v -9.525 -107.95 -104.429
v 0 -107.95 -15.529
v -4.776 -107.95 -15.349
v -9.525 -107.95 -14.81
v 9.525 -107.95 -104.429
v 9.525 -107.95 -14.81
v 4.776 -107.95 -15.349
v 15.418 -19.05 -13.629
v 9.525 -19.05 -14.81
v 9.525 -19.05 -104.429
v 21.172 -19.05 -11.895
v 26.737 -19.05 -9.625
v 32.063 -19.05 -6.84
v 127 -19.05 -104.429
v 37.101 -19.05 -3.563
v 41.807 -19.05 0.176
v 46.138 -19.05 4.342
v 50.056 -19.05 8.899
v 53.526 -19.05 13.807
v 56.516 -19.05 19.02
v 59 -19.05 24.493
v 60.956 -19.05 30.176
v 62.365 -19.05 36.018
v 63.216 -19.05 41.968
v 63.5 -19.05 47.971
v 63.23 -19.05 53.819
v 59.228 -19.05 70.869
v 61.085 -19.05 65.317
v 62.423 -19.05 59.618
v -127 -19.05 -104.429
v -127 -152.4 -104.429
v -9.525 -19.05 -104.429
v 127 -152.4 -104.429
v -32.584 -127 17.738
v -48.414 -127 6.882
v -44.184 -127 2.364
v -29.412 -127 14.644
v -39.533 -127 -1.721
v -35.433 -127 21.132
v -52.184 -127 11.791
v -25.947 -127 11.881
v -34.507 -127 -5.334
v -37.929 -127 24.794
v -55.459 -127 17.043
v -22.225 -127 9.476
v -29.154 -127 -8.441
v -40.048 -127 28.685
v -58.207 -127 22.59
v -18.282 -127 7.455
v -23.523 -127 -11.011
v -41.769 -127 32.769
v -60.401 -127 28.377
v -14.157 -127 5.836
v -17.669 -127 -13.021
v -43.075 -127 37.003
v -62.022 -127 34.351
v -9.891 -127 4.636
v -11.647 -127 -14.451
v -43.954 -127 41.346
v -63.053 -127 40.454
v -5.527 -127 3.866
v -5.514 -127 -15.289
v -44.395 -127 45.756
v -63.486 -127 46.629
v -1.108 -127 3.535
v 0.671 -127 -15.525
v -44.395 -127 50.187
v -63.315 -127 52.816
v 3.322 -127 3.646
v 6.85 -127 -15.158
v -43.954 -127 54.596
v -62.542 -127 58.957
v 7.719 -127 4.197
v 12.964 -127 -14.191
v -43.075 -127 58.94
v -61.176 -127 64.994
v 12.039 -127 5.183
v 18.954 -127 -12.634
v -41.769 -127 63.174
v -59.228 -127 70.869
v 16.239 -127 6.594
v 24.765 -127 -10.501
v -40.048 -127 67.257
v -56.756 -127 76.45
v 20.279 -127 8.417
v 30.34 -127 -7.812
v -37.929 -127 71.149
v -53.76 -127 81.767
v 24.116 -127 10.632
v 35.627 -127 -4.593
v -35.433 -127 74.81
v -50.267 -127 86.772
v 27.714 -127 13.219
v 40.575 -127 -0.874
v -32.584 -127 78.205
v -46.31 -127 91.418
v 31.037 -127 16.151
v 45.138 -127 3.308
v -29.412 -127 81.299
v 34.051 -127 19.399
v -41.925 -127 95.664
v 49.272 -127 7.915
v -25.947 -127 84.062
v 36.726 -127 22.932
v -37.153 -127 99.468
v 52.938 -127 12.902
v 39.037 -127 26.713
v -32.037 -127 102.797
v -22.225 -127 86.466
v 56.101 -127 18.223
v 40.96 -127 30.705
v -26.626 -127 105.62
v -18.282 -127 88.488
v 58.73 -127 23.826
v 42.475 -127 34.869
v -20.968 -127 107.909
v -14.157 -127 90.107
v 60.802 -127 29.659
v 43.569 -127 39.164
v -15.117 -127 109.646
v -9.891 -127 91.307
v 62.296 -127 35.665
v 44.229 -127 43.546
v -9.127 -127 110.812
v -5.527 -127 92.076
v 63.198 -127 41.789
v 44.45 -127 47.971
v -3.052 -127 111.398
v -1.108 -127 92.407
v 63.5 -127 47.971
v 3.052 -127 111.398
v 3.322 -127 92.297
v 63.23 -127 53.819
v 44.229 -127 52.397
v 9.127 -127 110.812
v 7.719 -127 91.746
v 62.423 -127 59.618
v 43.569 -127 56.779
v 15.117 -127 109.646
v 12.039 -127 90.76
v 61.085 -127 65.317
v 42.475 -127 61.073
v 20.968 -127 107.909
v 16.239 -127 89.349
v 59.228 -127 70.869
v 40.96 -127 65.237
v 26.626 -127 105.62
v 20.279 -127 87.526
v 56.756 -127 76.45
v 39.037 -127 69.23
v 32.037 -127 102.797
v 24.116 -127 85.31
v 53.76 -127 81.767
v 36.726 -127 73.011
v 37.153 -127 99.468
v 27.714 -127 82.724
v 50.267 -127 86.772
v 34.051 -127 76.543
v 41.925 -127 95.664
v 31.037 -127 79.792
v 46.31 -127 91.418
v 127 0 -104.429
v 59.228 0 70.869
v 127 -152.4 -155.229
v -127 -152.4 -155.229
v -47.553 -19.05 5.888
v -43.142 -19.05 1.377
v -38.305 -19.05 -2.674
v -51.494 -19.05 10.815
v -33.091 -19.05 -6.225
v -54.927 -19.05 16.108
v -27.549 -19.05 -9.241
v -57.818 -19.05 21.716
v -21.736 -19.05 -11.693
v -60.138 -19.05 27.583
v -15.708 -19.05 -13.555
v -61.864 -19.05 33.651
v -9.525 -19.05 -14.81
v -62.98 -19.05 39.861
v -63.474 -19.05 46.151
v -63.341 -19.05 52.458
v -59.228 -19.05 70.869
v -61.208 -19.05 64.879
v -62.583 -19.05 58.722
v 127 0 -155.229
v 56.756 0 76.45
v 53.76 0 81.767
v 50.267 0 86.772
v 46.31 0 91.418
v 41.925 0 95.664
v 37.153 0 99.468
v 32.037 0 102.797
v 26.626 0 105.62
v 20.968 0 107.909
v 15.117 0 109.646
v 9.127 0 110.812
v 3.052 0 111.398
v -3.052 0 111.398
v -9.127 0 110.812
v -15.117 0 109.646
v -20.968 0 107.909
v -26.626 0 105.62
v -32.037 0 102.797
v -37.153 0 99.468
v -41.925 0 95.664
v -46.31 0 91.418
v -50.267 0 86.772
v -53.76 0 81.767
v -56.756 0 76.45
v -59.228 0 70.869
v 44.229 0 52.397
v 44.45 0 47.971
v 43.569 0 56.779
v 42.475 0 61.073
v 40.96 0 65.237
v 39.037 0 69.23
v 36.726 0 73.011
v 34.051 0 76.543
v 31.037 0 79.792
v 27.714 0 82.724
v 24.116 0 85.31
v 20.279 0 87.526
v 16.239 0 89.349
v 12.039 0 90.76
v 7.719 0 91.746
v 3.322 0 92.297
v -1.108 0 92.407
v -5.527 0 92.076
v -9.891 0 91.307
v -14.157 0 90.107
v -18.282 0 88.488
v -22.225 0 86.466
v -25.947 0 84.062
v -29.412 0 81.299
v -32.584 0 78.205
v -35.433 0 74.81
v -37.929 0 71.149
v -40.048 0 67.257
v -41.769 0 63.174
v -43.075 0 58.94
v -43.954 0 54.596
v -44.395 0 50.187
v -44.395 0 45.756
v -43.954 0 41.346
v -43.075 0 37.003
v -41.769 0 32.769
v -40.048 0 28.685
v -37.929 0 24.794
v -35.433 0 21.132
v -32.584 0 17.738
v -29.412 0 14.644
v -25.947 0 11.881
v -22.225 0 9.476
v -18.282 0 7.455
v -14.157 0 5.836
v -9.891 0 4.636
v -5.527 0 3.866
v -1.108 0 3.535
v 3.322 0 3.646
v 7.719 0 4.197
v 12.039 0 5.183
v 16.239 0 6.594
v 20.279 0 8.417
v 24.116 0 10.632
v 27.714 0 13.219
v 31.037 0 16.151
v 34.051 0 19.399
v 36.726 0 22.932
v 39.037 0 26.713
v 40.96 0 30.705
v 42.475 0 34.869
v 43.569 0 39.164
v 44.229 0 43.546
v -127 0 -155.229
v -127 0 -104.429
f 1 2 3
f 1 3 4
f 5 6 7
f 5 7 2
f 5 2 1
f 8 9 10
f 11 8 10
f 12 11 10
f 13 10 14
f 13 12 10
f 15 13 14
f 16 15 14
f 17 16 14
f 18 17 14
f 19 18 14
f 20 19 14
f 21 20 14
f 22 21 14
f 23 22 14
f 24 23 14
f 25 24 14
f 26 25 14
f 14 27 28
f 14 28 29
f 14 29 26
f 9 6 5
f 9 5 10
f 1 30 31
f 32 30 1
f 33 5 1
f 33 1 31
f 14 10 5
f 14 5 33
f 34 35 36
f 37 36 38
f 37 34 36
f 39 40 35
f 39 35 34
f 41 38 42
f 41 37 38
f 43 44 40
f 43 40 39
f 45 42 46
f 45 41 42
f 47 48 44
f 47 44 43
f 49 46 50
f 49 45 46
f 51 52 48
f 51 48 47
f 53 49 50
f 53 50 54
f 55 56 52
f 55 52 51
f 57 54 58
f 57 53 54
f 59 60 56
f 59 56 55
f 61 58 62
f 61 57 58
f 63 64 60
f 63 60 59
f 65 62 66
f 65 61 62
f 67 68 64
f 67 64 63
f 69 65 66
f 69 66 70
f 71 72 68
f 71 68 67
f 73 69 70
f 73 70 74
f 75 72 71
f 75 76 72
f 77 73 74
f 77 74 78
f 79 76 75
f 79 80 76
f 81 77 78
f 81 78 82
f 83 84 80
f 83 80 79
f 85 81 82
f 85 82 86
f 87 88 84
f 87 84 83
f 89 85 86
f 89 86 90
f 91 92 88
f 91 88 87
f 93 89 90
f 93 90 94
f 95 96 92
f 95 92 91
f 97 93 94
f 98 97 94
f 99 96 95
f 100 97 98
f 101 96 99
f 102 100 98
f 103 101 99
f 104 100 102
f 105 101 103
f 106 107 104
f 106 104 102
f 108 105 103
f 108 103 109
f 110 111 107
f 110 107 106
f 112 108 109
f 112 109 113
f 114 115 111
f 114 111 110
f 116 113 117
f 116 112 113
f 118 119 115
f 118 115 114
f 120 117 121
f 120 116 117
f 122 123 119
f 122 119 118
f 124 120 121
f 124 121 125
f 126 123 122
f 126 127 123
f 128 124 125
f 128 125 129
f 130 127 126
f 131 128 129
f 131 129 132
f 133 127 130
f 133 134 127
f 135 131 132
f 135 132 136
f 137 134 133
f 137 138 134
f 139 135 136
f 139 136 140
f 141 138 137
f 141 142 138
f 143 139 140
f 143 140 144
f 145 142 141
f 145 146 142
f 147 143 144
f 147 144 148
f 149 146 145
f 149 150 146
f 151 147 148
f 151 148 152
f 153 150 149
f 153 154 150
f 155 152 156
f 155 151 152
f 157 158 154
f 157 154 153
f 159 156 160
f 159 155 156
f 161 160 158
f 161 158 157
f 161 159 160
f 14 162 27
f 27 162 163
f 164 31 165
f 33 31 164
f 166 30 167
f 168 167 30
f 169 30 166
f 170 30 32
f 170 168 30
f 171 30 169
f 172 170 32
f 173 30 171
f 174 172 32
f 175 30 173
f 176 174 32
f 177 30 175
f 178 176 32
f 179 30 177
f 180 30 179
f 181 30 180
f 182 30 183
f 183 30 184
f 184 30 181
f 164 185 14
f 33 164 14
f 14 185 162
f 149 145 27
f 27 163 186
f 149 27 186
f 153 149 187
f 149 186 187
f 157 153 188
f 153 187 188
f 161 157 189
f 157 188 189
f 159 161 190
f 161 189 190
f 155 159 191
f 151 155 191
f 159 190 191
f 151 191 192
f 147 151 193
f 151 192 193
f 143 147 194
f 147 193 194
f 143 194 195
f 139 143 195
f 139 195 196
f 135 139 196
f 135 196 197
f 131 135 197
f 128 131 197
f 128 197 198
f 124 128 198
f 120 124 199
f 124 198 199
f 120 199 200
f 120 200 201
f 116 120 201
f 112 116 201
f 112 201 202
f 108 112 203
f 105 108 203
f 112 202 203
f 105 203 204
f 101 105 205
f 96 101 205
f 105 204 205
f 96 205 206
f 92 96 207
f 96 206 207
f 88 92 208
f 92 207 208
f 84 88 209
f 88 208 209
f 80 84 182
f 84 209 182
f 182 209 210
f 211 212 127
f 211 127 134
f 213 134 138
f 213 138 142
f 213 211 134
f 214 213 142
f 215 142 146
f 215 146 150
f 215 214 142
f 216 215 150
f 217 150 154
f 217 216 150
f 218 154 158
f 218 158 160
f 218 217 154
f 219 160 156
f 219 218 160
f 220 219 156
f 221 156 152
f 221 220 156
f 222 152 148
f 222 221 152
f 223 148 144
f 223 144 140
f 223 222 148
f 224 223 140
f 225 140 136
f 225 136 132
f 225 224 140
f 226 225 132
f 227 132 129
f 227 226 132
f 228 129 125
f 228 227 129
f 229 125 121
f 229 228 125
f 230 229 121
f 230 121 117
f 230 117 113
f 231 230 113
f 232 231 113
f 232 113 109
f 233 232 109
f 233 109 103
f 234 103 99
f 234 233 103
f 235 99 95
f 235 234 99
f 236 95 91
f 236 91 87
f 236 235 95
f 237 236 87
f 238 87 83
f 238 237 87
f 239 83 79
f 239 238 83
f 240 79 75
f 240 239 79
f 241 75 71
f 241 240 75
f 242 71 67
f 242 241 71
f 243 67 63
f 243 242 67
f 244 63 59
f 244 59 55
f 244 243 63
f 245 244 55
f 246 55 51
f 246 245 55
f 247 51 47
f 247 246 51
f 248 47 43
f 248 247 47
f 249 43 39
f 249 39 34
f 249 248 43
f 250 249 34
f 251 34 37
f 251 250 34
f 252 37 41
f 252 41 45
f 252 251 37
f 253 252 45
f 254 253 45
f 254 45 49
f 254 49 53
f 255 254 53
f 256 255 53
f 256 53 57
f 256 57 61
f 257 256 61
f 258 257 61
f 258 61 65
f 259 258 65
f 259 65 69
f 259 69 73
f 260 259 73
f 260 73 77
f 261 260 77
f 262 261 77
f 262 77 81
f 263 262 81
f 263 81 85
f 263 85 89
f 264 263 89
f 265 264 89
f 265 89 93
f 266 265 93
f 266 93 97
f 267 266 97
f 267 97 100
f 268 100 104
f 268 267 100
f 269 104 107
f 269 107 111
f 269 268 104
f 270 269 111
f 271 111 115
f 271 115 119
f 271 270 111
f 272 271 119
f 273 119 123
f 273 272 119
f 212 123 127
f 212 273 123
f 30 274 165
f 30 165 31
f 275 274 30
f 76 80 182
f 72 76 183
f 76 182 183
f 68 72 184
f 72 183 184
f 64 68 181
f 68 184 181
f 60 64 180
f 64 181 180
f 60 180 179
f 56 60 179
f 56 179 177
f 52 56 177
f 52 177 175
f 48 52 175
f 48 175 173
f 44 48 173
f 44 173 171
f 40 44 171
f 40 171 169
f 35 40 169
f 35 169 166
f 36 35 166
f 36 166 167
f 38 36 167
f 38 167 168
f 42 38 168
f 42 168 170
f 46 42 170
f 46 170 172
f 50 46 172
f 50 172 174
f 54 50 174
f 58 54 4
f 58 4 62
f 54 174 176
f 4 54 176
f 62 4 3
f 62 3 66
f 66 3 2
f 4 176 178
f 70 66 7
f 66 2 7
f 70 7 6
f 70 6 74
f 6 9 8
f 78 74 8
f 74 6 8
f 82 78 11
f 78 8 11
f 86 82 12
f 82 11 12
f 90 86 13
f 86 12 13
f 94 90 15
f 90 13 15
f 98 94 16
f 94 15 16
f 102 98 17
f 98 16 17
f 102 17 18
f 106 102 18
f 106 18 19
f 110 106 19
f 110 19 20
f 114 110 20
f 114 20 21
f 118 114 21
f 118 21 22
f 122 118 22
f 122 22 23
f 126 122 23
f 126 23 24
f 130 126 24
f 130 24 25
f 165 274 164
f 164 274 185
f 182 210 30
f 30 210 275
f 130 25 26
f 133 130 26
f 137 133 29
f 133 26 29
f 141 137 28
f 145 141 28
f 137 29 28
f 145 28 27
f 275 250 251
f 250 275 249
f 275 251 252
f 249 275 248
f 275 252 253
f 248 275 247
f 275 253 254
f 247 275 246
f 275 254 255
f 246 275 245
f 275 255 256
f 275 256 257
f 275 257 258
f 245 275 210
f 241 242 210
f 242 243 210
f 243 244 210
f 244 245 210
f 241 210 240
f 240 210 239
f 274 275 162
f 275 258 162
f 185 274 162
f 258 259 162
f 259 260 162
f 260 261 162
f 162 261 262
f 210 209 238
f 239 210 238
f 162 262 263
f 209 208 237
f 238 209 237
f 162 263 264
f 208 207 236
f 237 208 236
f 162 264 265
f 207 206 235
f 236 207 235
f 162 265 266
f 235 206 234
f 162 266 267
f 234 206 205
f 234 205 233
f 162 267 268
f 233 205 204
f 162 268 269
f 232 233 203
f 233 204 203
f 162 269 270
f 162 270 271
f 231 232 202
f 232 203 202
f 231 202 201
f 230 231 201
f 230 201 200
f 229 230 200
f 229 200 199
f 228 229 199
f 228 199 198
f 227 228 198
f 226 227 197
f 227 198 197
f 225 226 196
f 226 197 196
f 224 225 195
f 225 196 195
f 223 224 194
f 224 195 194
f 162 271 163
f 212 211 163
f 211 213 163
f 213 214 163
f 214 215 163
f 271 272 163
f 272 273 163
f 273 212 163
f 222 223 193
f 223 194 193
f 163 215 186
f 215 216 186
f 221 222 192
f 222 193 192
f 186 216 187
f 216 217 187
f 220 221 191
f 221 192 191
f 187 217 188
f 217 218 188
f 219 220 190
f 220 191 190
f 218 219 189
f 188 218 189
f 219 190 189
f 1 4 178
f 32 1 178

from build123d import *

# Parameters (mm, degrees)
F0_W     = 254
F0_H     = 50.8
F1_DEPTH = 152.4
F2_DEPTH = 19.05
F0_R     = 44.45
F3_DEPTH = 127
F5_DEPTH = 9.525


with BuildPart() as f1:
    # F0 (on Front) → F1 (new body)
    with BuildSketch(Plane.XZ):
        with Locations((0, -129.828695)):
            Rectangle(F0_W, F0_H)
    extrude(amount=F1_DEPTH)

    # F0 (on Front) → F2 (join)
    with BuildSketch(Plane.XZ):
        with Locations((0, -129.828695)):
            Rectangle(F0_W, F0_H)
        with BuildLine():
            Line((-59.227747, 70.869428), (-127, -104.428695))
            Line((-127, -104.428695), (127, -104.428695))
            Line((127, -104.428695), (59.227747, 70.869428))
            ThreePointArc((59.227747, 70.869428), (62.4228, 59.617937), (63.5, 47.971305))
            ThreePointArc((63.5, 47.971305), (-11.646632, -14.451495), (-59.227747, 70.869428))
        make_face()
    extrude(amount=F2_DEPTH)

    # F0 (on Front) → F3 (join)
    with BuildSketch(Plane.XZ):
        with BuildLine():
            ThreePointArc((59.227747, 70.869428), (0, 111.471305), (-59.227747, 70.869428))
            ThreePointArc((-59.227747, 70.869428), (-11.646632, -14.451495), (63.5, 47.971305))
            ThreePointArc((63.5, 47.971305), (62.4228, 59.617937), (59.227747, 70.869428))
        make_face()
        with Locations((0, 47.971305)):
            Circle(F0_R, mode=Mode.SUBTRACT)
    extrude(amount=F3_DEPTH)

    # F4 (on Right) → F5 (join, symmetric)
    with BuildSketch(Plane.YZ):
        Polygon((-13.847807, -10.107701), (-107.95, -11.26233), (-107.95, -113.015743), (-13.847807, -113.015743), align=None)
    extrude(amount=F5_DEPTH, both=True)


solid = f1.part
